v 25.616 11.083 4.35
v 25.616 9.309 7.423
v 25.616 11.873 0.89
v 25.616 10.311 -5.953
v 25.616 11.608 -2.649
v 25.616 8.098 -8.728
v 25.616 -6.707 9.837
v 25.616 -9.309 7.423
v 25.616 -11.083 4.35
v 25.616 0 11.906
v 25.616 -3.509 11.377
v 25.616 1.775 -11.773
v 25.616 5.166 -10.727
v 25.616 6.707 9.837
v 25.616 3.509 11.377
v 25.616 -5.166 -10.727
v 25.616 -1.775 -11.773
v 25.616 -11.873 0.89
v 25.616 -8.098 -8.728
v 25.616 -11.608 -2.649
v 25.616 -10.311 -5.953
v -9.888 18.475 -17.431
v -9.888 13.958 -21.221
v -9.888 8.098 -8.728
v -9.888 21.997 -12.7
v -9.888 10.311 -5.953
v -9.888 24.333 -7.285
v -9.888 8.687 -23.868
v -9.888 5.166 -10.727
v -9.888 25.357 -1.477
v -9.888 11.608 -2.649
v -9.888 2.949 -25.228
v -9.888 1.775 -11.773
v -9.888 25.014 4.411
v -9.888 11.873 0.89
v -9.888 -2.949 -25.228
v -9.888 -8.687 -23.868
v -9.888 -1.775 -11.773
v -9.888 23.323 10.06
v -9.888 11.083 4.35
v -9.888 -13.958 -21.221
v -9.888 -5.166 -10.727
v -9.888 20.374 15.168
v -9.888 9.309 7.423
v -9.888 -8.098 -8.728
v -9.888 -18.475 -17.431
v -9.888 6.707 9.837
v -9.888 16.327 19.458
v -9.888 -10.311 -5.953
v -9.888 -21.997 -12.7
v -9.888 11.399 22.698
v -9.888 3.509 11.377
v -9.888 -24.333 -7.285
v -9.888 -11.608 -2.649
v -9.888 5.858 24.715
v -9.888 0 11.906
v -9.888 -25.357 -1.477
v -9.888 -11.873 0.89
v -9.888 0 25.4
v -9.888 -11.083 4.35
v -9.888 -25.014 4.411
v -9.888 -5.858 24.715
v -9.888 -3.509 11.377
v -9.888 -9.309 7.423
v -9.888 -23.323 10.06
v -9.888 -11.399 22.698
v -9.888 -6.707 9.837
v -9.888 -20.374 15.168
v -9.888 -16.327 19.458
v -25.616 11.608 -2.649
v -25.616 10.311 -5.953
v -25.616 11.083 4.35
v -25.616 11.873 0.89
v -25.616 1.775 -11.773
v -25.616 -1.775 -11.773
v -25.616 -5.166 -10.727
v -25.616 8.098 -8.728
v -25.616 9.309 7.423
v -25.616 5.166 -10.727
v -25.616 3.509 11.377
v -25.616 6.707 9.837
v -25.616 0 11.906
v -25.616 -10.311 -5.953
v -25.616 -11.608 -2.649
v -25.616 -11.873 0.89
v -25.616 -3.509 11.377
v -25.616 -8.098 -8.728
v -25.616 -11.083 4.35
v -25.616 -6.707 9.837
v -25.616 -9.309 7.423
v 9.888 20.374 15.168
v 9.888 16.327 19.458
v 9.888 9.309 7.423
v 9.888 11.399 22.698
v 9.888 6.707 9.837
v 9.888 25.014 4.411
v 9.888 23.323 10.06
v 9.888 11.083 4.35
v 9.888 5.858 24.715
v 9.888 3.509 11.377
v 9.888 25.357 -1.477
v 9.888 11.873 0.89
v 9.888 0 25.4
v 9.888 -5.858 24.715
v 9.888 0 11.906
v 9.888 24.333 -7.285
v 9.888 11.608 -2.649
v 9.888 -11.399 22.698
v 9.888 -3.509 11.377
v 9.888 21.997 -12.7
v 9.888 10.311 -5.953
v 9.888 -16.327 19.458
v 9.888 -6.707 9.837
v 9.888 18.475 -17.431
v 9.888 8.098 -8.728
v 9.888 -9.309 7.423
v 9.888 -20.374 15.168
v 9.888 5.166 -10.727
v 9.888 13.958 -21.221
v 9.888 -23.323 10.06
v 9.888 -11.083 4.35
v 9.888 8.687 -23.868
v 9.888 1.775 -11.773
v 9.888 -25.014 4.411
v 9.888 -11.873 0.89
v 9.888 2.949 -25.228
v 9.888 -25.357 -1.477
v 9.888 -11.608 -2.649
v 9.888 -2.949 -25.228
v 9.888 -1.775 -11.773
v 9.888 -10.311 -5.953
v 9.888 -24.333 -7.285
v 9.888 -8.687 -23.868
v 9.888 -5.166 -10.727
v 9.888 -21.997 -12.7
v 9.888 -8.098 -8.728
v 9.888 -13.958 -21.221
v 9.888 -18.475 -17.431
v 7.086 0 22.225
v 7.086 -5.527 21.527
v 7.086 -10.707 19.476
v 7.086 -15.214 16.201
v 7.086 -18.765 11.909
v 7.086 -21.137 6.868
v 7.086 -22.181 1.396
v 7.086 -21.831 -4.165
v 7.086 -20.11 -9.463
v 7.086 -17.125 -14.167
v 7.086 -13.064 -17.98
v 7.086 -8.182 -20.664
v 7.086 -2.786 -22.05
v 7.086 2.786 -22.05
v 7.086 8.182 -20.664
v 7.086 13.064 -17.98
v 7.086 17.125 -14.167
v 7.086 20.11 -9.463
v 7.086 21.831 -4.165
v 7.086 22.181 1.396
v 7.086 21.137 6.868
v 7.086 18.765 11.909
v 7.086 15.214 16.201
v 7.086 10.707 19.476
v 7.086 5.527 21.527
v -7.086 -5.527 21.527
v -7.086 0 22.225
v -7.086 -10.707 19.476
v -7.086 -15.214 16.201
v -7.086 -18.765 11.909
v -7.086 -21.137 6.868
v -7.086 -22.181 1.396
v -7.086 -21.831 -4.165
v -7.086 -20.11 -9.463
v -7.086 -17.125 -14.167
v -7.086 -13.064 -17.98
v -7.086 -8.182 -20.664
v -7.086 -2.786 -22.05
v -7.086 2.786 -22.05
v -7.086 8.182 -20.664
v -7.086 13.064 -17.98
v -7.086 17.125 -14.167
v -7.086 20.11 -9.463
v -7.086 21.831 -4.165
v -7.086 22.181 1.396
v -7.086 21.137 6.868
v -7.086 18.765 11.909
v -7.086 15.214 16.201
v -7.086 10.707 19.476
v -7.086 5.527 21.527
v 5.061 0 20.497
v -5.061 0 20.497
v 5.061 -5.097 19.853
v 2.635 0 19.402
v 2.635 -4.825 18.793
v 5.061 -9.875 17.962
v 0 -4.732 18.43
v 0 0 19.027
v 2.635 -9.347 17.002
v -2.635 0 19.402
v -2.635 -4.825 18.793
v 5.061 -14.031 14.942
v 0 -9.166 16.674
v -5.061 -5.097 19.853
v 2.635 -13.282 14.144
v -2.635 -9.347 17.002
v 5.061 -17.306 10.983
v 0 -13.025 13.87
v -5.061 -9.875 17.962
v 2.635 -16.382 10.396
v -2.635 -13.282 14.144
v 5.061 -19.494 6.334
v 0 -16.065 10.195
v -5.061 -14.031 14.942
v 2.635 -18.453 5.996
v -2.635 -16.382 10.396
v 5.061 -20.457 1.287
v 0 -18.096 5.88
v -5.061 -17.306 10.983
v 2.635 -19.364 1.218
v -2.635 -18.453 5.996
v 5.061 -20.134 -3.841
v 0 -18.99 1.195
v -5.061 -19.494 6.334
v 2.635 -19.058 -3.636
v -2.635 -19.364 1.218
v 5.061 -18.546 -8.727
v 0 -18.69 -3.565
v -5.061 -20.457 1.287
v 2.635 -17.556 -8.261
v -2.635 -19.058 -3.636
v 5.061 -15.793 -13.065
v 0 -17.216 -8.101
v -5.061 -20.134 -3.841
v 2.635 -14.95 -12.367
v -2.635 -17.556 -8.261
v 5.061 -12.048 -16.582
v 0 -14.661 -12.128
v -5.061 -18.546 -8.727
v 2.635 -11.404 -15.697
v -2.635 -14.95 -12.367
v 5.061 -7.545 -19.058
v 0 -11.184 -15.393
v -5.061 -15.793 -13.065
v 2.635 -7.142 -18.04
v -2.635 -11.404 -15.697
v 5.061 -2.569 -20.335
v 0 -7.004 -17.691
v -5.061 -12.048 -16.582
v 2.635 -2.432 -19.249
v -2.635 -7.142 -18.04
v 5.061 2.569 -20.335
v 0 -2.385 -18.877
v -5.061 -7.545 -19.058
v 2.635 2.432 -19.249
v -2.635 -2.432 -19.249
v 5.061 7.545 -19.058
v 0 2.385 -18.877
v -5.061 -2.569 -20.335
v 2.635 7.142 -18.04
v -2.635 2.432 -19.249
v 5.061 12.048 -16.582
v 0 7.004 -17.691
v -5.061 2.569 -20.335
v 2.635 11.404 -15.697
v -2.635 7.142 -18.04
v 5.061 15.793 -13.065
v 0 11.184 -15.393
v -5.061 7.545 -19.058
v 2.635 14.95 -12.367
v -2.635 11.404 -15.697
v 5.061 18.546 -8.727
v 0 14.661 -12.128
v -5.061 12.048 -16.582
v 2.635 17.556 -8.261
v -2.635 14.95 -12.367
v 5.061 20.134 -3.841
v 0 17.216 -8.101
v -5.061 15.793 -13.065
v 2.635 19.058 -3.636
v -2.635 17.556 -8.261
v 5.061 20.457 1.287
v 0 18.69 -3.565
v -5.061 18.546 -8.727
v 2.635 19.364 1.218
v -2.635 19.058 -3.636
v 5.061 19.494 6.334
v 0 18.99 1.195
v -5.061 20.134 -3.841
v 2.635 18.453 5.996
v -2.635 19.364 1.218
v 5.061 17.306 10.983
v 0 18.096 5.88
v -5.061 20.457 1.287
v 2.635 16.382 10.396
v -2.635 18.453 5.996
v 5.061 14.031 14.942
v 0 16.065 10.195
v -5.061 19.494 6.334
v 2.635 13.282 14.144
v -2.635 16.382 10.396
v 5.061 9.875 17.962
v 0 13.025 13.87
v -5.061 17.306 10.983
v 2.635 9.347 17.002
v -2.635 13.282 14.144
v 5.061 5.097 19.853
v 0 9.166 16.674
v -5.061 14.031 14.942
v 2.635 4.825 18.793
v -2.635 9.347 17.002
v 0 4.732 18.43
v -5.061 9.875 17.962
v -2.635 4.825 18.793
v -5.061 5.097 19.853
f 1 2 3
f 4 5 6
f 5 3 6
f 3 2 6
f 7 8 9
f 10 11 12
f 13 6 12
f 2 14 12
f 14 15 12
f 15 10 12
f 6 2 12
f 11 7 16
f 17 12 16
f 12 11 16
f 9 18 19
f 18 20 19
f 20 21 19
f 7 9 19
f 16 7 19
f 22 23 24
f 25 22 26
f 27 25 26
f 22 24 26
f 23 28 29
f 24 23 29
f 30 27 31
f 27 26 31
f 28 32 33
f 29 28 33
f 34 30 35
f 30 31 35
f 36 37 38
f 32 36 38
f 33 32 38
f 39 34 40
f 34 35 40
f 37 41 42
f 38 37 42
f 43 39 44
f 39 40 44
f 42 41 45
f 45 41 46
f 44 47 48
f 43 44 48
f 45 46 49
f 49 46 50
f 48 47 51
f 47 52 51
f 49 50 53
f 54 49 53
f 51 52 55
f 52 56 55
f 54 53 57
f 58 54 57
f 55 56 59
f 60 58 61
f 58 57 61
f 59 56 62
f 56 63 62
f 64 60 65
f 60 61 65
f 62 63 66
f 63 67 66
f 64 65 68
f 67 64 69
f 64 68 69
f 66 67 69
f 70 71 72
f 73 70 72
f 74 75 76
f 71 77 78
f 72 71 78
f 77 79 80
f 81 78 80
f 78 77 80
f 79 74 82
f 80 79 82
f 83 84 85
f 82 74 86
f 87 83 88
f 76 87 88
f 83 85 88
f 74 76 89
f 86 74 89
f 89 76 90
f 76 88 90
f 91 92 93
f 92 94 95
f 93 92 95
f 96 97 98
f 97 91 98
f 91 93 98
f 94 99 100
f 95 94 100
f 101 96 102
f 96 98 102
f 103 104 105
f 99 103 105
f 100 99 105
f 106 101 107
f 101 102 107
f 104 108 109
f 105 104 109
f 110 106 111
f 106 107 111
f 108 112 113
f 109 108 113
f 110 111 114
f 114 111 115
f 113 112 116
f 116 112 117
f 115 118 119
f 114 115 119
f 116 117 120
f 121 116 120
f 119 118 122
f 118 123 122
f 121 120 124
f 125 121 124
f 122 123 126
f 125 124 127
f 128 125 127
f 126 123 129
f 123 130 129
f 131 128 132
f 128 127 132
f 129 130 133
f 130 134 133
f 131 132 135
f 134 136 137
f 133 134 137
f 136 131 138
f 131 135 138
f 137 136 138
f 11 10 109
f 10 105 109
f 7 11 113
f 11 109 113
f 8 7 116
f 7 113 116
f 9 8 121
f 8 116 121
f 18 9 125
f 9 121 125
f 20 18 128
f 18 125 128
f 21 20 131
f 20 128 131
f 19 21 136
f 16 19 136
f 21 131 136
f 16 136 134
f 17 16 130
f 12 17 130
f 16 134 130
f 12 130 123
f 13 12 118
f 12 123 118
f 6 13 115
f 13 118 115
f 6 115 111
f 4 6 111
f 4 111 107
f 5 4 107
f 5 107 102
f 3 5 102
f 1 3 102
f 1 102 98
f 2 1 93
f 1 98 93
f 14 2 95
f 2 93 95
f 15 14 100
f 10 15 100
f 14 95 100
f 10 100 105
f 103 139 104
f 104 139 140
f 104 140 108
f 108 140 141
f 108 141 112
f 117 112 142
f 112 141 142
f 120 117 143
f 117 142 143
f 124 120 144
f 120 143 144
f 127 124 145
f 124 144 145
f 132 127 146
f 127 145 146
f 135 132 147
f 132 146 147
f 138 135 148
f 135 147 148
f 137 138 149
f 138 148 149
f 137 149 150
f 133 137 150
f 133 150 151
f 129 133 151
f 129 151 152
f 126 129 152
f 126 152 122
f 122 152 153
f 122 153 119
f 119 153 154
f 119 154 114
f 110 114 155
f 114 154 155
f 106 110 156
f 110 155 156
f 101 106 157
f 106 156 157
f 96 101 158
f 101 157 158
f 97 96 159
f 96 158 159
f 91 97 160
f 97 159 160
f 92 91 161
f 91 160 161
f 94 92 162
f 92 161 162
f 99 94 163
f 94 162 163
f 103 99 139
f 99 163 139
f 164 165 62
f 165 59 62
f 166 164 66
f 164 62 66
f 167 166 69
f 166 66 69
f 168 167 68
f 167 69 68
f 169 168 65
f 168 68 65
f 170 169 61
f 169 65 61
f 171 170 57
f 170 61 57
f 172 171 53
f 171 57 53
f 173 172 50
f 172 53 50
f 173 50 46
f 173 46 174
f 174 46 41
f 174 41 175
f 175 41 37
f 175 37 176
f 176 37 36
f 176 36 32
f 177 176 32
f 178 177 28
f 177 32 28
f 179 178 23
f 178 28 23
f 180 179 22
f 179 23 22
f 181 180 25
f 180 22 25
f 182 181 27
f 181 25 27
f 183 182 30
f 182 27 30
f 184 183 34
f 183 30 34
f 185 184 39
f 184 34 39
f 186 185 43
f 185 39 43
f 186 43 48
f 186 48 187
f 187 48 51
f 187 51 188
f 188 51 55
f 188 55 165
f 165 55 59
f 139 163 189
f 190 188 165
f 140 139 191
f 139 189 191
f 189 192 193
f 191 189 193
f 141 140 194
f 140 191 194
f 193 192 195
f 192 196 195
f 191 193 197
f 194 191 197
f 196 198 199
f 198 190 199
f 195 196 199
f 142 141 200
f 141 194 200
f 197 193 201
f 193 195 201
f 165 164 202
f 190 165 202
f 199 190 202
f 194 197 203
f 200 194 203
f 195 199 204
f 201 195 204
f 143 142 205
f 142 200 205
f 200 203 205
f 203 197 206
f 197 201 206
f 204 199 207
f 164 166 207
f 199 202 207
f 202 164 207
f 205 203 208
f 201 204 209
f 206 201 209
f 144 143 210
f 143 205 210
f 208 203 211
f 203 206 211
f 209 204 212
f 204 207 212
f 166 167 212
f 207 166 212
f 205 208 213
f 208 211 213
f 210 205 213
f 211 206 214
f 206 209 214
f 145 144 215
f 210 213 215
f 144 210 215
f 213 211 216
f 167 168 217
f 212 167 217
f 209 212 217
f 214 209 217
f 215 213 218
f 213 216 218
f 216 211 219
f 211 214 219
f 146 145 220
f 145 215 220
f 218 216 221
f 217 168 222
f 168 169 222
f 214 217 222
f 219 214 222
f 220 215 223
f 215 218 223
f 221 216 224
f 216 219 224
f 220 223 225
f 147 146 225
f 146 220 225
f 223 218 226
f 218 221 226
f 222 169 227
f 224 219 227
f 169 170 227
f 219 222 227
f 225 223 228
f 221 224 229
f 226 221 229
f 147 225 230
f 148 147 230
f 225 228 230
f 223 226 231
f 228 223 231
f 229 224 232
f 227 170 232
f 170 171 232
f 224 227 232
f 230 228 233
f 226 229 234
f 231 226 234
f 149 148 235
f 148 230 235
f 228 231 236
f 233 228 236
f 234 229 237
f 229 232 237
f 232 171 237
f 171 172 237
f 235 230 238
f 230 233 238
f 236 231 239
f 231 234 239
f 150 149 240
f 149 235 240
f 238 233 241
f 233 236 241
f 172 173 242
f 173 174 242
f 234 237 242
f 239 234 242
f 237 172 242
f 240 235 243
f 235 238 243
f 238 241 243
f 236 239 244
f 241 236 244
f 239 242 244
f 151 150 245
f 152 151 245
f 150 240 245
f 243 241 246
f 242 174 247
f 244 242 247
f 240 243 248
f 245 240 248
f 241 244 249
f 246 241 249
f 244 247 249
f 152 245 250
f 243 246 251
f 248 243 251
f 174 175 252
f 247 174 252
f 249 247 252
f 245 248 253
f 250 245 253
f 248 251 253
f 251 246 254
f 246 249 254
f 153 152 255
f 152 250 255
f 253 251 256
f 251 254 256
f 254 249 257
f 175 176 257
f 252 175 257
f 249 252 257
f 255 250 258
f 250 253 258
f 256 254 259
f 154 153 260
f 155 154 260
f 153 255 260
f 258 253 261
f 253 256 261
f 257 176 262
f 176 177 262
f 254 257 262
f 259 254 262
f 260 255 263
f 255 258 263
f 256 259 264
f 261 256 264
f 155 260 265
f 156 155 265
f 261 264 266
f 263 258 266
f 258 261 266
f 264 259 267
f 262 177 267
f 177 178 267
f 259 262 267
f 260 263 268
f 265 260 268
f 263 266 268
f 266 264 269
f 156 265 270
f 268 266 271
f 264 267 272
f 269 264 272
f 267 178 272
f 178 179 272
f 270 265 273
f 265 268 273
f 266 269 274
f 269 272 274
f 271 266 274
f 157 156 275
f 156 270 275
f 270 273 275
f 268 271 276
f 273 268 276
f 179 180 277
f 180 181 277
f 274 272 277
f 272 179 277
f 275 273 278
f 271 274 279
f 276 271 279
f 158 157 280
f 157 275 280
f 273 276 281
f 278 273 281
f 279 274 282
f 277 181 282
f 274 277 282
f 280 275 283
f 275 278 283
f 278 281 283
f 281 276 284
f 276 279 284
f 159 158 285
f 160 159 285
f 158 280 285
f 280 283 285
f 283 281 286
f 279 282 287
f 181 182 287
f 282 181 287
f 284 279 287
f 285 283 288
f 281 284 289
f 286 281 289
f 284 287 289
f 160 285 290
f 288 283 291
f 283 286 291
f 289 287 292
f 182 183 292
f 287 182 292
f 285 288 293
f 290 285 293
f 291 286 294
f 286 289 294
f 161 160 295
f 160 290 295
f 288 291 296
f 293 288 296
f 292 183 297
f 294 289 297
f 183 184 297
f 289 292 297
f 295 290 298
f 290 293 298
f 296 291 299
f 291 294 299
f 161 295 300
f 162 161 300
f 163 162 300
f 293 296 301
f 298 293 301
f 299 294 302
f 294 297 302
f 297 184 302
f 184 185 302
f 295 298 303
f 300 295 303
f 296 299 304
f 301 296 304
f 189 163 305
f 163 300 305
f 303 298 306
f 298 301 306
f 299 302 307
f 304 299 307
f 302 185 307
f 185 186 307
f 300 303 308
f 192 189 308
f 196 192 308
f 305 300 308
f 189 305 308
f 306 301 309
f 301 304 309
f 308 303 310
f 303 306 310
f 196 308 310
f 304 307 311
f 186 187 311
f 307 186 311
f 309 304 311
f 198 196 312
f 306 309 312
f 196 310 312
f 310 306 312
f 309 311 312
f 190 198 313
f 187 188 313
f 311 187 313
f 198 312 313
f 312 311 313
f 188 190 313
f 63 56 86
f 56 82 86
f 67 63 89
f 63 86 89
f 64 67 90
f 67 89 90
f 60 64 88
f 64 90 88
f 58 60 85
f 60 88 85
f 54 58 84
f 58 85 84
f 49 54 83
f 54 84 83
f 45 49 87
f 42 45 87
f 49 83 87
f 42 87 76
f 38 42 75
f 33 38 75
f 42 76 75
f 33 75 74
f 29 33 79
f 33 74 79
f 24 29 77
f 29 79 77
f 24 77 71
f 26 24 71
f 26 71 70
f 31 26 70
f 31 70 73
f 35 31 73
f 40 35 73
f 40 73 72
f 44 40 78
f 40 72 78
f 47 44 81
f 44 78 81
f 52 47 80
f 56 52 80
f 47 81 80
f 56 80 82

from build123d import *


with BuildPart() as f1:
    # F0 (on Front) → F1 (revolve)
    with BuildSketch(Plane.XZ):
        with BuildLine():
            Line((25.6159, 0), (25.6159, 11.90625))
            Line((25.6159, 11.90625), (9.887509, 11.90625))
            Line((9.887509, 11.90625), (9.887509, 25.4))
            Line((9.887509, 25.4), (7.086038, 22.225))
            ThreePointArc((7.086038, 22.225), (0, 19.027293), (-7.086038, 22.225))
            Line((-7.086038, 22.225), (-9.887509, 25.4))
            Line((-9.887509, 25.4), (-9.887509, 11.90625))
            Line((-9.887509, 11.90625), (-25.6159, 11.90625))
            Line((-25.6159, 11.90625), (-25.6159, 0))
            Line((-25.6159, 0), (25.6159, 0))
        make_face()
    revolve(axis=Axis((0, 0, 0), (1, 0, 0)))


solid = f1.part
